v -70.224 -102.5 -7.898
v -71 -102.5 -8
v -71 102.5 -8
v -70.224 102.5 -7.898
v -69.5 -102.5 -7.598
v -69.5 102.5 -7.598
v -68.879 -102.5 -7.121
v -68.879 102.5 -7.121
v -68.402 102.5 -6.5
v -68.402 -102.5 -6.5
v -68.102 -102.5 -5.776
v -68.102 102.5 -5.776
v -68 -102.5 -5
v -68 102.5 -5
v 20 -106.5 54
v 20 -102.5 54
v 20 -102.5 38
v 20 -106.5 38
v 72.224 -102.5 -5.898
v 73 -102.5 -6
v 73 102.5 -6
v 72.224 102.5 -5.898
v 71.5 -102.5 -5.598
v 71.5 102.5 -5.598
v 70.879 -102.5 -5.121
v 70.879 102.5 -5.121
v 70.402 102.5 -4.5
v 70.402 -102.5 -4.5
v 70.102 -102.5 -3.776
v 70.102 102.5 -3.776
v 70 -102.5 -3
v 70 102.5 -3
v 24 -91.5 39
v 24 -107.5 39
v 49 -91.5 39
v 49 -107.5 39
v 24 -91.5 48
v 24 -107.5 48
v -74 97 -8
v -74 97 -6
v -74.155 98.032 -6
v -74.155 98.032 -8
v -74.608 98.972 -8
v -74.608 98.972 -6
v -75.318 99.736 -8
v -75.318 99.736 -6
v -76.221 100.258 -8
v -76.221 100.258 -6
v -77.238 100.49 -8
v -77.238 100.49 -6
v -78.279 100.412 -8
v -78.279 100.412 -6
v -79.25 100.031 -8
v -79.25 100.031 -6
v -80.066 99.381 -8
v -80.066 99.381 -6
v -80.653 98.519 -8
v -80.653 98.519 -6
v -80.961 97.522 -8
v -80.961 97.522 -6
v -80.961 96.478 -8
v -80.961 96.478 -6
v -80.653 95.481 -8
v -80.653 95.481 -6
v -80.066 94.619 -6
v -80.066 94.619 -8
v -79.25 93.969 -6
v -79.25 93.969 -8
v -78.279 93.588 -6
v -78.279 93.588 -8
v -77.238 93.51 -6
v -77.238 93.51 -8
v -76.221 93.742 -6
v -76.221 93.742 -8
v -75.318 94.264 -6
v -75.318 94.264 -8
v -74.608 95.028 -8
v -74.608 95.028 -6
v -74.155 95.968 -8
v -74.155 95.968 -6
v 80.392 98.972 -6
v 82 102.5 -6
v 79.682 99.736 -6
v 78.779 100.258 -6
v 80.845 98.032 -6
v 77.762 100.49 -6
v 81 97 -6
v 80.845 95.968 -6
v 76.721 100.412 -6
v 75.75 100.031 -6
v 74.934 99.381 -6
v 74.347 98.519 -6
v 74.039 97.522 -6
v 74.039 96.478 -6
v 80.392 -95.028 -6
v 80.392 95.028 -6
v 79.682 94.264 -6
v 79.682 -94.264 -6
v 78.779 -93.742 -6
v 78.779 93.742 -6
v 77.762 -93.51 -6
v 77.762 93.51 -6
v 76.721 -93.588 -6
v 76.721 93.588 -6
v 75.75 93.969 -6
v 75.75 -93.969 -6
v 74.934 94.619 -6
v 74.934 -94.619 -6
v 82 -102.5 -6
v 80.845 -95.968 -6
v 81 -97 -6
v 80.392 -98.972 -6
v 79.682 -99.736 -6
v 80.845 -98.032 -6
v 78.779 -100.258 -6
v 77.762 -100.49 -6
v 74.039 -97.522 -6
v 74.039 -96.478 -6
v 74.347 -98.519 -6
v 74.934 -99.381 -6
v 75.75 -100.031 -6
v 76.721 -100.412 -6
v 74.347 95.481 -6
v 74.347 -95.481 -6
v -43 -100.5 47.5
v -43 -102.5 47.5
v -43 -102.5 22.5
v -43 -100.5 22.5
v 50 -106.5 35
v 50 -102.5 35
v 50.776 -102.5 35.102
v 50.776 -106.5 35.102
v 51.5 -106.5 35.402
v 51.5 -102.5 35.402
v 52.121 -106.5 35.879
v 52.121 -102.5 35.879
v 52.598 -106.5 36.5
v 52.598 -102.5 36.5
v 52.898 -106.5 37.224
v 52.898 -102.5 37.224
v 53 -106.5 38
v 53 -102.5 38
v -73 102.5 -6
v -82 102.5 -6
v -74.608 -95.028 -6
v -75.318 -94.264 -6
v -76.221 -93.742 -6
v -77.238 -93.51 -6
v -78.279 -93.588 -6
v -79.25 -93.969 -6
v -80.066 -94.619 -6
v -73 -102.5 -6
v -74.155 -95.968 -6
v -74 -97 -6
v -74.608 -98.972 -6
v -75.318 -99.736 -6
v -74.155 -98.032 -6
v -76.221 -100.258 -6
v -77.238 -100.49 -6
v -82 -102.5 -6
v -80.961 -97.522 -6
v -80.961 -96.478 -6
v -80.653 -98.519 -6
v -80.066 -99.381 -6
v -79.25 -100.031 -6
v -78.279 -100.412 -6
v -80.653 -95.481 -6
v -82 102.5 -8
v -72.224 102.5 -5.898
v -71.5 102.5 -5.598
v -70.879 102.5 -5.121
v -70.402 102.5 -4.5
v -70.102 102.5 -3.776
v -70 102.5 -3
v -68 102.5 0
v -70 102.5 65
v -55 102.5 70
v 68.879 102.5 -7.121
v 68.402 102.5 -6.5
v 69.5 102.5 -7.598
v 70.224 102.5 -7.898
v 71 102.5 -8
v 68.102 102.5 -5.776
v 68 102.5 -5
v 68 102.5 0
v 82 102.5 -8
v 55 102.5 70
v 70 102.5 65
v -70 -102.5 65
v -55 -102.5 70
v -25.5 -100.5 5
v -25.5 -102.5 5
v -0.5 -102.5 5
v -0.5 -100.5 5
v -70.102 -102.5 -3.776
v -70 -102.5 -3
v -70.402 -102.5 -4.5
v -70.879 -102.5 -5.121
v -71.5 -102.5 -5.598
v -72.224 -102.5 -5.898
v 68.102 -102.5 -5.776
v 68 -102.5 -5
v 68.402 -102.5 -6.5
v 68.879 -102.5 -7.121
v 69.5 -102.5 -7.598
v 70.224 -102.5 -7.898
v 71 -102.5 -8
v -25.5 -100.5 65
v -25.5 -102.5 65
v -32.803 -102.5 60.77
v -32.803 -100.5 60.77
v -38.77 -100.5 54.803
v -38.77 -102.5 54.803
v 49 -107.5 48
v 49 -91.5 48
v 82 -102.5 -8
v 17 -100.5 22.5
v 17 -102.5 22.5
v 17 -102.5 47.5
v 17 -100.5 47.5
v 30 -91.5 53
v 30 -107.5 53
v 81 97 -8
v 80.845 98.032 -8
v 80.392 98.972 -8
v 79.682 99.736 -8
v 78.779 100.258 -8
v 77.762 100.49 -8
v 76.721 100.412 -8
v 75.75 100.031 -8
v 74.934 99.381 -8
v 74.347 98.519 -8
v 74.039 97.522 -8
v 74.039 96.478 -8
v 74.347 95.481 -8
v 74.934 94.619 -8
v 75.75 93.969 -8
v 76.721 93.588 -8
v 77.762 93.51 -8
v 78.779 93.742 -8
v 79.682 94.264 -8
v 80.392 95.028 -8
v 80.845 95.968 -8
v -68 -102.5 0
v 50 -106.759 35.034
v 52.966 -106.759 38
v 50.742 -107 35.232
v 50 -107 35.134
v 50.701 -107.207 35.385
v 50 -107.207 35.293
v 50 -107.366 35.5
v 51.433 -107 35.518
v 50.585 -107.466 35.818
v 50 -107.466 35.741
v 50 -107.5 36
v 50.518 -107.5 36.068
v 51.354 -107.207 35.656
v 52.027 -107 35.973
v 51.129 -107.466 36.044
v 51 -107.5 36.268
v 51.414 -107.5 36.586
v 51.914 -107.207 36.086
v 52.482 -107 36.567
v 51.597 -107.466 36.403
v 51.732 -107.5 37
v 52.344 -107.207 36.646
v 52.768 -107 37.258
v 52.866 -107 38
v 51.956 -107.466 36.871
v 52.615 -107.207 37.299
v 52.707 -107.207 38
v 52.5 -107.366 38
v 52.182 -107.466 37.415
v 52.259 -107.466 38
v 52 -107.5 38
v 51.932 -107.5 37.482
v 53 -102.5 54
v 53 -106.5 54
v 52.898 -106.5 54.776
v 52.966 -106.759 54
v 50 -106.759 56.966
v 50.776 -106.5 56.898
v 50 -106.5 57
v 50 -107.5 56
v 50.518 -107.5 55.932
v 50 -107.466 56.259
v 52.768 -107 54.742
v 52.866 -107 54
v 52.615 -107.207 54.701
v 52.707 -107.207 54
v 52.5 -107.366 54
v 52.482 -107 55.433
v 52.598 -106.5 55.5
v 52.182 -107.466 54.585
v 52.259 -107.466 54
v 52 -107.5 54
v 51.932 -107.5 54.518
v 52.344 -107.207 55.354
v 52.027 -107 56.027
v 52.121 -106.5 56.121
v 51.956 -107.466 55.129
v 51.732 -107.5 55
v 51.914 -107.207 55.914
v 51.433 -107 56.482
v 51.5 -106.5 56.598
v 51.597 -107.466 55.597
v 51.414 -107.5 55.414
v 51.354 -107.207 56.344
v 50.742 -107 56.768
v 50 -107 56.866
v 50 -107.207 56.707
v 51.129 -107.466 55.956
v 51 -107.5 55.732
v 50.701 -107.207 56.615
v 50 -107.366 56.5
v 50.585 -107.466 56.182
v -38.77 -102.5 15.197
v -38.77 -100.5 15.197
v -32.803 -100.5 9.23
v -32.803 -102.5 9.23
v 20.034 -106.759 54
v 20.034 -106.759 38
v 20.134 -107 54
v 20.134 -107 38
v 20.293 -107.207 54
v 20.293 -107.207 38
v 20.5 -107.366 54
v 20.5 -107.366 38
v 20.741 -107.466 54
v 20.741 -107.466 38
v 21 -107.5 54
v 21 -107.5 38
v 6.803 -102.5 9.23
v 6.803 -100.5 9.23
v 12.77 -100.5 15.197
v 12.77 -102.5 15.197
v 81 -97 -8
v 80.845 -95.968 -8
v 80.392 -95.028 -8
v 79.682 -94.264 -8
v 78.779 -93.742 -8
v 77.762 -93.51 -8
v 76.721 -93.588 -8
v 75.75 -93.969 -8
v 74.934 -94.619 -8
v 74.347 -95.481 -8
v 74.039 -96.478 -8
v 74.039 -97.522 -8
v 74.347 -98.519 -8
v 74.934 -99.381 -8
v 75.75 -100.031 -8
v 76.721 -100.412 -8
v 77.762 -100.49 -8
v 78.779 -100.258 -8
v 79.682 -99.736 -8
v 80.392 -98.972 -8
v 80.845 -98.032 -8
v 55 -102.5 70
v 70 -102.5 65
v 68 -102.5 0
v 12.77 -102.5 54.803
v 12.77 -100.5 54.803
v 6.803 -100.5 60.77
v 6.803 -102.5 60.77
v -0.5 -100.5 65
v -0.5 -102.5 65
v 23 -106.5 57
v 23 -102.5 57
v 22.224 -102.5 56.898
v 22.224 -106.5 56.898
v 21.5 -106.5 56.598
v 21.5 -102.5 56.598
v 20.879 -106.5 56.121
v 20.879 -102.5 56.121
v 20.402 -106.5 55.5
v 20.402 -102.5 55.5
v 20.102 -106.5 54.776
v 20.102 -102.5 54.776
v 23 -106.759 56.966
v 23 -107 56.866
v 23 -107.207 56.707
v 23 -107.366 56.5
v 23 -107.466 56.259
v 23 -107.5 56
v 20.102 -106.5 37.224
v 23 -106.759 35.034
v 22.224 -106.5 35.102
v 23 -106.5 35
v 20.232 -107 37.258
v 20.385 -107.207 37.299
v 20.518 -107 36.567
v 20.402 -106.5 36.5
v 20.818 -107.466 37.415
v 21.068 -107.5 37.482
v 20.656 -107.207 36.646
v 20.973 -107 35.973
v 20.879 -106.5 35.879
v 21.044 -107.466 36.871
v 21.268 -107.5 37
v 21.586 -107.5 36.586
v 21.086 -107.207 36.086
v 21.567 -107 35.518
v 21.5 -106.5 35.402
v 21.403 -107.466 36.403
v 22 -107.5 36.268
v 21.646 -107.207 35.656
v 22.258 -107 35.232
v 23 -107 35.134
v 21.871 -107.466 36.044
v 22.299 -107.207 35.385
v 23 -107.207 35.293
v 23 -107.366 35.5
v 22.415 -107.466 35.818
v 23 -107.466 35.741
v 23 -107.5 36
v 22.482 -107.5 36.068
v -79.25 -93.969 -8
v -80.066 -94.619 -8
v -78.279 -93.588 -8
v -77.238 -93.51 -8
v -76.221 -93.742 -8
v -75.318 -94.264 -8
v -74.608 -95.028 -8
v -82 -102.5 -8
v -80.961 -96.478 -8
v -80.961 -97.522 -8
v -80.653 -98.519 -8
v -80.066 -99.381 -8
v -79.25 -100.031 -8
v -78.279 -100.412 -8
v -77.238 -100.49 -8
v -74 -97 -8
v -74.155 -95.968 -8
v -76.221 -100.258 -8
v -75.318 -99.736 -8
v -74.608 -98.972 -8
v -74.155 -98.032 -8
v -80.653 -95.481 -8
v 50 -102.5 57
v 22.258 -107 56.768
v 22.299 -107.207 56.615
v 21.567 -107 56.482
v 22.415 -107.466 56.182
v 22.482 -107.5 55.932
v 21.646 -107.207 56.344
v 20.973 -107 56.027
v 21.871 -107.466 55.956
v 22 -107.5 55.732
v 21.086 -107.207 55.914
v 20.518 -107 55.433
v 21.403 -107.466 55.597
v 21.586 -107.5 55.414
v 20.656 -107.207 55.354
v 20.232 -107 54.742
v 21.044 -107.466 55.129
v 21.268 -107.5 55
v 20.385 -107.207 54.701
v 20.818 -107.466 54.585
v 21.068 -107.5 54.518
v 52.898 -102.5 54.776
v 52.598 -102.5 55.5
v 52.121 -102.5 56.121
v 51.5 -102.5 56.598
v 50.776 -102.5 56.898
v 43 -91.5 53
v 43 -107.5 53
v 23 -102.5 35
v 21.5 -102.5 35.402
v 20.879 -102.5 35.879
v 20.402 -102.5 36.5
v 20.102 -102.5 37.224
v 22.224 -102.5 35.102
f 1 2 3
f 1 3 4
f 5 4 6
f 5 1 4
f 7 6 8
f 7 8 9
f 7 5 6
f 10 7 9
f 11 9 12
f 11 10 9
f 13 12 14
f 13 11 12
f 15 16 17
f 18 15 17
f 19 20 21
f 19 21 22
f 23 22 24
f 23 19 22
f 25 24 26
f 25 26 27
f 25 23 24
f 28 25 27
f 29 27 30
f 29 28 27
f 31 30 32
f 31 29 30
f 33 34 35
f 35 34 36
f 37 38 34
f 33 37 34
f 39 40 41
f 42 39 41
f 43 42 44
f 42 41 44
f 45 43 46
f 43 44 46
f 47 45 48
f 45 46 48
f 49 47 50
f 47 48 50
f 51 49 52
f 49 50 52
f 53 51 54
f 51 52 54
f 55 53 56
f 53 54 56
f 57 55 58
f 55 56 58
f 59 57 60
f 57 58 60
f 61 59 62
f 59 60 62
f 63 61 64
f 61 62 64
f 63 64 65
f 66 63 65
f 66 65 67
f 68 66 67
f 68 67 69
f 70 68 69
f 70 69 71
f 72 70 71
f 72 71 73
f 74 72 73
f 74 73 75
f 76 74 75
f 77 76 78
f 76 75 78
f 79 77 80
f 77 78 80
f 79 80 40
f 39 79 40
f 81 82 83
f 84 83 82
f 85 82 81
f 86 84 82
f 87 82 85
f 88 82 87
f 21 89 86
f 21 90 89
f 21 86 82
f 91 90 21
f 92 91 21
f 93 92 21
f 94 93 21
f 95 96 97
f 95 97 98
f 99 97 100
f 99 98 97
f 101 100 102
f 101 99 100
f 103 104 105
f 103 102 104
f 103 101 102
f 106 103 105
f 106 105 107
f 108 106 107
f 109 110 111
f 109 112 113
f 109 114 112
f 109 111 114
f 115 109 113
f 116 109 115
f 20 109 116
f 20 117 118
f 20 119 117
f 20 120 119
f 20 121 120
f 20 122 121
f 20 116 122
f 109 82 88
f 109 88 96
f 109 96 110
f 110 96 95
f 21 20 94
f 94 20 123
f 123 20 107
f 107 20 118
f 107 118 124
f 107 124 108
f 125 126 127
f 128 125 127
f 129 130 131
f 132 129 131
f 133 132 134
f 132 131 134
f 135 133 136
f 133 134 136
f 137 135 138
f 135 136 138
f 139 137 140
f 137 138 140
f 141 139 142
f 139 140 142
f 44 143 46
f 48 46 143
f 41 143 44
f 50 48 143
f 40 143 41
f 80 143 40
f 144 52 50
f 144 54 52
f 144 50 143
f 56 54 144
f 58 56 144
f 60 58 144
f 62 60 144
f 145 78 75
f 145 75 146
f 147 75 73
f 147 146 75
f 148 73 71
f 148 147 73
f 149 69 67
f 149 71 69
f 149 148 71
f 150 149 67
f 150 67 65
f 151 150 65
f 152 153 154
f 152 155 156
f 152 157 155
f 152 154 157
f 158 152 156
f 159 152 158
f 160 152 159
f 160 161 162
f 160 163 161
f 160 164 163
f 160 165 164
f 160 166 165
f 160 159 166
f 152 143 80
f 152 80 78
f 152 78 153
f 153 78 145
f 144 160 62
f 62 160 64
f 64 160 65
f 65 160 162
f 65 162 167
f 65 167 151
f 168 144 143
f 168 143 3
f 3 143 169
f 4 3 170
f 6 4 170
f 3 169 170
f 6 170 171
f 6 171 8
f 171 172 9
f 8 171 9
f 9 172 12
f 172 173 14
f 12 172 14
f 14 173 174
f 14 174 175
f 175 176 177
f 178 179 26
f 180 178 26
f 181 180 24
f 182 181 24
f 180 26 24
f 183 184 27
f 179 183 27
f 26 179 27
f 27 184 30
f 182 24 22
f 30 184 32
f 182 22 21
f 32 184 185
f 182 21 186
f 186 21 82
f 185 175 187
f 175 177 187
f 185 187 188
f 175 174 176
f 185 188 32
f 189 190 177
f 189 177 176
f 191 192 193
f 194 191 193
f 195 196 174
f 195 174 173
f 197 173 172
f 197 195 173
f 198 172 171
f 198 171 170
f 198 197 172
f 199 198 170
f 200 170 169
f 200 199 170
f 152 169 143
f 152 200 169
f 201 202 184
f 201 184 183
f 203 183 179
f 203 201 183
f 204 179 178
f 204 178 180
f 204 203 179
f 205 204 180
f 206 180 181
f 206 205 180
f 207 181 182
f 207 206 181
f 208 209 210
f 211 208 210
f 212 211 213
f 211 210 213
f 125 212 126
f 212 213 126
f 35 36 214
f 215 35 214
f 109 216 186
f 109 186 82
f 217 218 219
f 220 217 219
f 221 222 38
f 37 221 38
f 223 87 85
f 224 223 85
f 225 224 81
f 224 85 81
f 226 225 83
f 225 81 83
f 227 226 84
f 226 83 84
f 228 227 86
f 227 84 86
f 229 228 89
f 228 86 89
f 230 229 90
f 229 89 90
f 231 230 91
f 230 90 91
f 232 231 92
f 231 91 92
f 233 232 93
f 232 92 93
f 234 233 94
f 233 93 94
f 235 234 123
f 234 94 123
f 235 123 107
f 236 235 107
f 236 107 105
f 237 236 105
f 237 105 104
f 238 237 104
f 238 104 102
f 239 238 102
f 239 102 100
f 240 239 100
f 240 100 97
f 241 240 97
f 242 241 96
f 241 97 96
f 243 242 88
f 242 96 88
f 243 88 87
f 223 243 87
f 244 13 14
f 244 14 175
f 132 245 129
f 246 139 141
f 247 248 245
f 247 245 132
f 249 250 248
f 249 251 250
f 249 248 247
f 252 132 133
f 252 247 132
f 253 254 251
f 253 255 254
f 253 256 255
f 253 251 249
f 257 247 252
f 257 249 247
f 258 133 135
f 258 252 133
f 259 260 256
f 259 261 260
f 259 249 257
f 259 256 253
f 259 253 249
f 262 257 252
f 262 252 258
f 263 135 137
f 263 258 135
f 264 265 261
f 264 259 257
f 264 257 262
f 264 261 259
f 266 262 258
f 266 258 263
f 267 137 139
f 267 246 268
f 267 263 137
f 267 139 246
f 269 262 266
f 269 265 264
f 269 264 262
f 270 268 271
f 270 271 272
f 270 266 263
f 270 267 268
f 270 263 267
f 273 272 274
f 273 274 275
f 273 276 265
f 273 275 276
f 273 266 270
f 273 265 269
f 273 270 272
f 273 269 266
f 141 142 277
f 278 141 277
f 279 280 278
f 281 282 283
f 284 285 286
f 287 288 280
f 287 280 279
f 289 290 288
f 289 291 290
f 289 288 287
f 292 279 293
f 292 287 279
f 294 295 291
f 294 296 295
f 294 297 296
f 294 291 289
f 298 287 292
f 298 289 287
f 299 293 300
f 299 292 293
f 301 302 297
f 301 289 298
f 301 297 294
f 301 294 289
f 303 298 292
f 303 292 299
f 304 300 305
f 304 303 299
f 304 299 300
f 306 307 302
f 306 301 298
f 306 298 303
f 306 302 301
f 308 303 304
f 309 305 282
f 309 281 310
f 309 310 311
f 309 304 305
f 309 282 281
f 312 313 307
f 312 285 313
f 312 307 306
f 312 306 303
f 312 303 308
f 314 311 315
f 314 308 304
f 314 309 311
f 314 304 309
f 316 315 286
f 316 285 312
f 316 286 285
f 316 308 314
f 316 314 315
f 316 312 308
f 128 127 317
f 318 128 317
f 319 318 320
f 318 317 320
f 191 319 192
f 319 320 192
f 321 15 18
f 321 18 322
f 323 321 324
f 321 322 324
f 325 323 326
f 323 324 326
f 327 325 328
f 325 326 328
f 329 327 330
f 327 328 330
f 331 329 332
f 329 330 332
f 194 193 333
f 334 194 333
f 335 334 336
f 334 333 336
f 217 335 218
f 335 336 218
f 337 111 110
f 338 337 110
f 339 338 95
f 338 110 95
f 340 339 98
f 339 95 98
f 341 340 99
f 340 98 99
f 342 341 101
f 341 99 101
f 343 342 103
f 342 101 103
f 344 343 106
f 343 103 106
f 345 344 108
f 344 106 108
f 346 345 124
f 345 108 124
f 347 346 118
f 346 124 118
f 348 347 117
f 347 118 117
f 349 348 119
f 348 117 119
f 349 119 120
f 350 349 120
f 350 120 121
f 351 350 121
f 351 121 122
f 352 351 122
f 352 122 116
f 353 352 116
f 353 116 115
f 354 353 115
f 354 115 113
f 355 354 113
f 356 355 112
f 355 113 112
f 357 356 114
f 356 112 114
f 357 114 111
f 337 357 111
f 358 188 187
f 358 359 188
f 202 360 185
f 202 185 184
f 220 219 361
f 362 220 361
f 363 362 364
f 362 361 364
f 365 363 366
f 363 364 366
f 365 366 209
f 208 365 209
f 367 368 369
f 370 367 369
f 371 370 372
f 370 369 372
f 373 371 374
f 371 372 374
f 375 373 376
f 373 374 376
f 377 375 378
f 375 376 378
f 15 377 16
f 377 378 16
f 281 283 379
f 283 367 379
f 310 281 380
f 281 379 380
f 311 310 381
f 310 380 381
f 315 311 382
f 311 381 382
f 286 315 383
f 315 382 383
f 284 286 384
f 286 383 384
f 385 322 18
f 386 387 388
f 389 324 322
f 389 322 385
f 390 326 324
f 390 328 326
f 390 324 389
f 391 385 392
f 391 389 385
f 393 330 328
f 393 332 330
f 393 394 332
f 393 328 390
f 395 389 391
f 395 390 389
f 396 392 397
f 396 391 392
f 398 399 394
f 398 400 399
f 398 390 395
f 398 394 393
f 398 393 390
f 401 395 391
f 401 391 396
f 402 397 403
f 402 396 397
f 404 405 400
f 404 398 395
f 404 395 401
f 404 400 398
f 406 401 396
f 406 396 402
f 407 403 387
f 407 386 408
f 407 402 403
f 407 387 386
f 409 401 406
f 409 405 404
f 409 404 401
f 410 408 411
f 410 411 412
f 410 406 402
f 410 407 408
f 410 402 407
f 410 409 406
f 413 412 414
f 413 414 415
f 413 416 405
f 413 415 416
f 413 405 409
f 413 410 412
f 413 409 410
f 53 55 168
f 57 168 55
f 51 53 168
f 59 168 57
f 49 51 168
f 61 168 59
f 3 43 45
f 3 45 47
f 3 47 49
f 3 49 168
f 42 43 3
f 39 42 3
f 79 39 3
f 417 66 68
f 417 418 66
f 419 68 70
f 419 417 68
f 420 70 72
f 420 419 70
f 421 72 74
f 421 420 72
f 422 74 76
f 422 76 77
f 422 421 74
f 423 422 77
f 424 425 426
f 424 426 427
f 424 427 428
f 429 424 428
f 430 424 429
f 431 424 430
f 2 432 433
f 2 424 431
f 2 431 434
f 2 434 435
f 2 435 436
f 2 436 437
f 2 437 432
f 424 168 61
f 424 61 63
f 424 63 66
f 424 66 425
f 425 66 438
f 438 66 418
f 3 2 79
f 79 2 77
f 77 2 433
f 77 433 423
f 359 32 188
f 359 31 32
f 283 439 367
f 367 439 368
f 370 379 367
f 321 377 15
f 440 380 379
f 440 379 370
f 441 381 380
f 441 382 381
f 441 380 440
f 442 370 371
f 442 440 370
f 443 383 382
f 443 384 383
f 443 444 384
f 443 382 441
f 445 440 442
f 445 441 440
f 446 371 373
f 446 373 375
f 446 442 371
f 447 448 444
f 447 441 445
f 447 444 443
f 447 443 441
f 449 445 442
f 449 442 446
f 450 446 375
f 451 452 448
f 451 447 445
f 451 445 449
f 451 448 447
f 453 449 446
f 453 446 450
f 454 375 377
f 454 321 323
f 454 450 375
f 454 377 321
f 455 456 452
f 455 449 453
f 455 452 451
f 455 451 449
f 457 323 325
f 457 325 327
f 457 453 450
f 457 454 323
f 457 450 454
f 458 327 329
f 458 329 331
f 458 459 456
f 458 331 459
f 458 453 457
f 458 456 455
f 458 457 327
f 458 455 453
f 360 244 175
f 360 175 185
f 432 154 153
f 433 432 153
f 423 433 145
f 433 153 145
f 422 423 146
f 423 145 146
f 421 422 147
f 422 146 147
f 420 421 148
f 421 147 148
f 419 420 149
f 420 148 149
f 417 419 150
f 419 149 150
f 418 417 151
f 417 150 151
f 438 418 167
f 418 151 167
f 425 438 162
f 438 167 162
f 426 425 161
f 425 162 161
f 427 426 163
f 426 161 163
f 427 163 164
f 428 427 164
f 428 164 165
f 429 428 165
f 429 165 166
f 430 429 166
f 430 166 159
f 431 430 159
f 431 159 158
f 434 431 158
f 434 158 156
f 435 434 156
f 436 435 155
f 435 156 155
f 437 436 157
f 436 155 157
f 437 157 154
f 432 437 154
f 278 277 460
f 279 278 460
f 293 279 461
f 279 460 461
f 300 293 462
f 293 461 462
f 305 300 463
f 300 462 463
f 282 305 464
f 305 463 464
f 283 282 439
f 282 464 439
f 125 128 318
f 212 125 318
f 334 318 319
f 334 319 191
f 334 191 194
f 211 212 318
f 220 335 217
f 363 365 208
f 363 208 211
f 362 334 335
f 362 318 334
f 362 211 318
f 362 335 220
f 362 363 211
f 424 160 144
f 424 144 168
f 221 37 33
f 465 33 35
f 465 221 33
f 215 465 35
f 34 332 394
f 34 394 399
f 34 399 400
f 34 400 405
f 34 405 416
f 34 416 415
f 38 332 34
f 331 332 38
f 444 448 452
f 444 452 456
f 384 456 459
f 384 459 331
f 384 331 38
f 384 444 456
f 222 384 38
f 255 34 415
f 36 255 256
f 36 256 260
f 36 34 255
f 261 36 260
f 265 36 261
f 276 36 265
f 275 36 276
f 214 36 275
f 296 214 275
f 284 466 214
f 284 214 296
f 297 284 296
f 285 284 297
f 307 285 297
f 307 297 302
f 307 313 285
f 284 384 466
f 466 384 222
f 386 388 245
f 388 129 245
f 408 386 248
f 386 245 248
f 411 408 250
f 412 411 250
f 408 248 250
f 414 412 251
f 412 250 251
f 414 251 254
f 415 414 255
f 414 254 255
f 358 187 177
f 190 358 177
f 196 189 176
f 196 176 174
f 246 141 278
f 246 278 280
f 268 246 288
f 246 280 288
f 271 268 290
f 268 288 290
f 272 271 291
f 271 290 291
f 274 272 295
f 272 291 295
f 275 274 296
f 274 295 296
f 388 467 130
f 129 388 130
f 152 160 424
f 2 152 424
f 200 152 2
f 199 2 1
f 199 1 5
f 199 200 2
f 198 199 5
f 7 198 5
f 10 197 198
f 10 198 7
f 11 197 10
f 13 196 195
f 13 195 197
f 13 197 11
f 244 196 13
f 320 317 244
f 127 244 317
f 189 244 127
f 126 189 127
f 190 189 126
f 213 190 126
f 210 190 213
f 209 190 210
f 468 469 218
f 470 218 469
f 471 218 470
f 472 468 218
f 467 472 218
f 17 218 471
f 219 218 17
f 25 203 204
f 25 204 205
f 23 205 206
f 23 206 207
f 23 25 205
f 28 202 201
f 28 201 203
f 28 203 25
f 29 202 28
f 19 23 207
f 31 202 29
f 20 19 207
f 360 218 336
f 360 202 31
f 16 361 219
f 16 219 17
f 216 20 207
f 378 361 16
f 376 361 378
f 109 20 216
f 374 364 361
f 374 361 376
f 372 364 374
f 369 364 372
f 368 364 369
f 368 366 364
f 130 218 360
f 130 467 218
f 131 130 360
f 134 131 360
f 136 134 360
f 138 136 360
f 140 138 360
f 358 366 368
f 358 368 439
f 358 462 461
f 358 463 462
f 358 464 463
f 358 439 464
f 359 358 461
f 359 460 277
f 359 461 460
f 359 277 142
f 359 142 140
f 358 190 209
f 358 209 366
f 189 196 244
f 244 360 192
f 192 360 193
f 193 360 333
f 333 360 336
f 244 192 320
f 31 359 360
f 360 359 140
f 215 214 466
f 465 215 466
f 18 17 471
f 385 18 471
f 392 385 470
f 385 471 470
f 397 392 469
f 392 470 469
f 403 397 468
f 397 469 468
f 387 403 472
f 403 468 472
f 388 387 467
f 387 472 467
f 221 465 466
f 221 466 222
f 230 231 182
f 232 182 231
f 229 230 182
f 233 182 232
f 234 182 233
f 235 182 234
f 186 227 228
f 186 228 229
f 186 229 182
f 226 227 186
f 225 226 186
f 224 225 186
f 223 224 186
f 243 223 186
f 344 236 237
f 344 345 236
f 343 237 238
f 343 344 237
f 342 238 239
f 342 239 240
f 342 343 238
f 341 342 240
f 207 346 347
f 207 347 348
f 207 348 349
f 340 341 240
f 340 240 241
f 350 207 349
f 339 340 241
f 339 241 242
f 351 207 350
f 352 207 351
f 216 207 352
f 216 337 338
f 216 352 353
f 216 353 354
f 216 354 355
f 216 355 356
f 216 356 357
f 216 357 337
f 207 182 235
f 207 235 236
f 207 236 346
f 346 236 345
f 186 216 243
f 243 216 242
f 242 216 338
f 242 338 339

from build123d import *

# Parameters (mm, degrees)
F1_DEPTH  = 102.5
F2_R      = 3.5
F3_DEPTH  = 2
F5_DEPTH  = 5
F6_R      = 1
F8_DEPTH  = 16
F10_DEPTH = 2


with BuildPart() as f1:
    # F0 (on Front) → F1 (new body, symmetric)
    with BuildSketch(Plane.XZ):
        Polygon((55, 70), (0, 70), (-55, 70), (-70, 65), (-70, 0), (-68, 0), (0, 0), (68, 0), (70, 0), (70, 65), align=None)
        with BuildLine():
            Line((70, -3), (70, 0))
            Line((70, 0), (68, 0))
            Line((68, 0), (68, -5))
            ThreePointArc((68, -5), (68.87868, -7.12132), (71, -8))
            Line((71, -8), (82, -8))
            Line((82, -8), (82, -6))
            Line((82, -6), (73, -6))
            ThreePointArc((73, -6), (70.87868, -5.12132), (70, -3))
        make_face()
        with BuildLine():
            Line((-68, 0), (-70, 0))
            Line((-70, 0), (-70, -3))
            ThreePointArc((-70, -3), (-70.87868, -5.12132), (-73, -6))
            Line((-73, -6), (-82, -6))
            Line((-82, -6), (-82, -8))
            Line((-82, -8), (-71, -8))
            ThreePointArc((-71, -8), (-68.87868, -7.12132), (-68, -5))
            Line((-68, -5), (-68, 0))
        make_face()
    extrude(amount=F1_DEPTH, both=True)

    # F2 (on face) → F3 (cut, through all)
    with BuildSketch(Plane.XY.offset(-6)):
        with Locations((77.5, -97)):
            Circle(F2_R)
        with Locations((77.5, 97)):
            Circle(F2_R)
        with Locations((-77.5, -97)):
            Circle(F2_R)
        with Locations((-77.5, 97)):
            Circle(F2_R)
    extrude(amount=-F3_DEPTH, mode=Mode.SUBTRACT)

    # F4 (on face) → F5 (join)
    with BuildSketch(Plane.XZ.offset(102.5)):
        with BuildLine():
            Line((50, 57), (23, 57))
            ThreePointArc((23, 57), (20.87868, 56.12132), (20, 54))
            Line((20, 54), (20, 38))
            ThreePointArc((20, 38), (20.87868, 35.87868), (23, 35))
            Line((23, 35), (50, 35))
            ThreePointArc((50, 35), (52.12132, 35.87868), (53, 38))
            Line((53, 38), (53, 54))
            ThreePointArc((53, 54), (52.12132, 56.12132), (50, 57))
        make_face()
    extrude(amount=F5_DEPTH)

    # F6
    f6_edges = [f1.edges().sort_by_distance(p)[0] for p in [
        (36.5, -107.5, 57),
        (20.87868, -107.5, 56.12132),
        (20, -107.5, 46),
        (20.87868, -107.5, 35.87868),
        (36.5, -107.5, 35),
        (52.12132, -107.5, 35.87868),
        (53, -107.5, 46),
        (52.12132, -107.5, 56.12132),
    ]]
    fillet(f6_edges, radius=F6_R)

    # F7 (on face) → F8 (cut)
    with BuildSketch(Plane.XZ.offset(107.5)):
        Polygon((43, 53), (30, 53), (24, 48), (24, 39), (49, 39), (49, 48), align=None)
    extrude(amount=-F8_DEPTH, mode=Mode.SUBTRACT)

    # F9 (on face) → F10 (cut)
    with BuildSketch(Plane.XZ.offset(102.5)):
        with BuildLine():
            Line((17, 22.5), (17, 47.5))
            ThreePointArc((17, 47.5), (9.98097, 57.98097), (-0.5, 65))
            Line((-0.5, 65), (-25.5, 65))
            ThreePointArc((-25.5, 65), (-35.98097, 57.98097), (-43, 47.5))
            Line((-43, 47.5), (-43, 22.5))
            ThreePointArc((-43, 22.5), (-35.98097, 12.01903), (-25.5, 5))
            Line((-25.5, 5), (-0.5, 5))
            ThreePointArc((-0.5, 5), (9.98097, 12.01903), (17, 22.5))
        make_face()
    extrude(amount=-F10_DEPTH, mode=Mode.SUBTRACT)


solid = f1.part
